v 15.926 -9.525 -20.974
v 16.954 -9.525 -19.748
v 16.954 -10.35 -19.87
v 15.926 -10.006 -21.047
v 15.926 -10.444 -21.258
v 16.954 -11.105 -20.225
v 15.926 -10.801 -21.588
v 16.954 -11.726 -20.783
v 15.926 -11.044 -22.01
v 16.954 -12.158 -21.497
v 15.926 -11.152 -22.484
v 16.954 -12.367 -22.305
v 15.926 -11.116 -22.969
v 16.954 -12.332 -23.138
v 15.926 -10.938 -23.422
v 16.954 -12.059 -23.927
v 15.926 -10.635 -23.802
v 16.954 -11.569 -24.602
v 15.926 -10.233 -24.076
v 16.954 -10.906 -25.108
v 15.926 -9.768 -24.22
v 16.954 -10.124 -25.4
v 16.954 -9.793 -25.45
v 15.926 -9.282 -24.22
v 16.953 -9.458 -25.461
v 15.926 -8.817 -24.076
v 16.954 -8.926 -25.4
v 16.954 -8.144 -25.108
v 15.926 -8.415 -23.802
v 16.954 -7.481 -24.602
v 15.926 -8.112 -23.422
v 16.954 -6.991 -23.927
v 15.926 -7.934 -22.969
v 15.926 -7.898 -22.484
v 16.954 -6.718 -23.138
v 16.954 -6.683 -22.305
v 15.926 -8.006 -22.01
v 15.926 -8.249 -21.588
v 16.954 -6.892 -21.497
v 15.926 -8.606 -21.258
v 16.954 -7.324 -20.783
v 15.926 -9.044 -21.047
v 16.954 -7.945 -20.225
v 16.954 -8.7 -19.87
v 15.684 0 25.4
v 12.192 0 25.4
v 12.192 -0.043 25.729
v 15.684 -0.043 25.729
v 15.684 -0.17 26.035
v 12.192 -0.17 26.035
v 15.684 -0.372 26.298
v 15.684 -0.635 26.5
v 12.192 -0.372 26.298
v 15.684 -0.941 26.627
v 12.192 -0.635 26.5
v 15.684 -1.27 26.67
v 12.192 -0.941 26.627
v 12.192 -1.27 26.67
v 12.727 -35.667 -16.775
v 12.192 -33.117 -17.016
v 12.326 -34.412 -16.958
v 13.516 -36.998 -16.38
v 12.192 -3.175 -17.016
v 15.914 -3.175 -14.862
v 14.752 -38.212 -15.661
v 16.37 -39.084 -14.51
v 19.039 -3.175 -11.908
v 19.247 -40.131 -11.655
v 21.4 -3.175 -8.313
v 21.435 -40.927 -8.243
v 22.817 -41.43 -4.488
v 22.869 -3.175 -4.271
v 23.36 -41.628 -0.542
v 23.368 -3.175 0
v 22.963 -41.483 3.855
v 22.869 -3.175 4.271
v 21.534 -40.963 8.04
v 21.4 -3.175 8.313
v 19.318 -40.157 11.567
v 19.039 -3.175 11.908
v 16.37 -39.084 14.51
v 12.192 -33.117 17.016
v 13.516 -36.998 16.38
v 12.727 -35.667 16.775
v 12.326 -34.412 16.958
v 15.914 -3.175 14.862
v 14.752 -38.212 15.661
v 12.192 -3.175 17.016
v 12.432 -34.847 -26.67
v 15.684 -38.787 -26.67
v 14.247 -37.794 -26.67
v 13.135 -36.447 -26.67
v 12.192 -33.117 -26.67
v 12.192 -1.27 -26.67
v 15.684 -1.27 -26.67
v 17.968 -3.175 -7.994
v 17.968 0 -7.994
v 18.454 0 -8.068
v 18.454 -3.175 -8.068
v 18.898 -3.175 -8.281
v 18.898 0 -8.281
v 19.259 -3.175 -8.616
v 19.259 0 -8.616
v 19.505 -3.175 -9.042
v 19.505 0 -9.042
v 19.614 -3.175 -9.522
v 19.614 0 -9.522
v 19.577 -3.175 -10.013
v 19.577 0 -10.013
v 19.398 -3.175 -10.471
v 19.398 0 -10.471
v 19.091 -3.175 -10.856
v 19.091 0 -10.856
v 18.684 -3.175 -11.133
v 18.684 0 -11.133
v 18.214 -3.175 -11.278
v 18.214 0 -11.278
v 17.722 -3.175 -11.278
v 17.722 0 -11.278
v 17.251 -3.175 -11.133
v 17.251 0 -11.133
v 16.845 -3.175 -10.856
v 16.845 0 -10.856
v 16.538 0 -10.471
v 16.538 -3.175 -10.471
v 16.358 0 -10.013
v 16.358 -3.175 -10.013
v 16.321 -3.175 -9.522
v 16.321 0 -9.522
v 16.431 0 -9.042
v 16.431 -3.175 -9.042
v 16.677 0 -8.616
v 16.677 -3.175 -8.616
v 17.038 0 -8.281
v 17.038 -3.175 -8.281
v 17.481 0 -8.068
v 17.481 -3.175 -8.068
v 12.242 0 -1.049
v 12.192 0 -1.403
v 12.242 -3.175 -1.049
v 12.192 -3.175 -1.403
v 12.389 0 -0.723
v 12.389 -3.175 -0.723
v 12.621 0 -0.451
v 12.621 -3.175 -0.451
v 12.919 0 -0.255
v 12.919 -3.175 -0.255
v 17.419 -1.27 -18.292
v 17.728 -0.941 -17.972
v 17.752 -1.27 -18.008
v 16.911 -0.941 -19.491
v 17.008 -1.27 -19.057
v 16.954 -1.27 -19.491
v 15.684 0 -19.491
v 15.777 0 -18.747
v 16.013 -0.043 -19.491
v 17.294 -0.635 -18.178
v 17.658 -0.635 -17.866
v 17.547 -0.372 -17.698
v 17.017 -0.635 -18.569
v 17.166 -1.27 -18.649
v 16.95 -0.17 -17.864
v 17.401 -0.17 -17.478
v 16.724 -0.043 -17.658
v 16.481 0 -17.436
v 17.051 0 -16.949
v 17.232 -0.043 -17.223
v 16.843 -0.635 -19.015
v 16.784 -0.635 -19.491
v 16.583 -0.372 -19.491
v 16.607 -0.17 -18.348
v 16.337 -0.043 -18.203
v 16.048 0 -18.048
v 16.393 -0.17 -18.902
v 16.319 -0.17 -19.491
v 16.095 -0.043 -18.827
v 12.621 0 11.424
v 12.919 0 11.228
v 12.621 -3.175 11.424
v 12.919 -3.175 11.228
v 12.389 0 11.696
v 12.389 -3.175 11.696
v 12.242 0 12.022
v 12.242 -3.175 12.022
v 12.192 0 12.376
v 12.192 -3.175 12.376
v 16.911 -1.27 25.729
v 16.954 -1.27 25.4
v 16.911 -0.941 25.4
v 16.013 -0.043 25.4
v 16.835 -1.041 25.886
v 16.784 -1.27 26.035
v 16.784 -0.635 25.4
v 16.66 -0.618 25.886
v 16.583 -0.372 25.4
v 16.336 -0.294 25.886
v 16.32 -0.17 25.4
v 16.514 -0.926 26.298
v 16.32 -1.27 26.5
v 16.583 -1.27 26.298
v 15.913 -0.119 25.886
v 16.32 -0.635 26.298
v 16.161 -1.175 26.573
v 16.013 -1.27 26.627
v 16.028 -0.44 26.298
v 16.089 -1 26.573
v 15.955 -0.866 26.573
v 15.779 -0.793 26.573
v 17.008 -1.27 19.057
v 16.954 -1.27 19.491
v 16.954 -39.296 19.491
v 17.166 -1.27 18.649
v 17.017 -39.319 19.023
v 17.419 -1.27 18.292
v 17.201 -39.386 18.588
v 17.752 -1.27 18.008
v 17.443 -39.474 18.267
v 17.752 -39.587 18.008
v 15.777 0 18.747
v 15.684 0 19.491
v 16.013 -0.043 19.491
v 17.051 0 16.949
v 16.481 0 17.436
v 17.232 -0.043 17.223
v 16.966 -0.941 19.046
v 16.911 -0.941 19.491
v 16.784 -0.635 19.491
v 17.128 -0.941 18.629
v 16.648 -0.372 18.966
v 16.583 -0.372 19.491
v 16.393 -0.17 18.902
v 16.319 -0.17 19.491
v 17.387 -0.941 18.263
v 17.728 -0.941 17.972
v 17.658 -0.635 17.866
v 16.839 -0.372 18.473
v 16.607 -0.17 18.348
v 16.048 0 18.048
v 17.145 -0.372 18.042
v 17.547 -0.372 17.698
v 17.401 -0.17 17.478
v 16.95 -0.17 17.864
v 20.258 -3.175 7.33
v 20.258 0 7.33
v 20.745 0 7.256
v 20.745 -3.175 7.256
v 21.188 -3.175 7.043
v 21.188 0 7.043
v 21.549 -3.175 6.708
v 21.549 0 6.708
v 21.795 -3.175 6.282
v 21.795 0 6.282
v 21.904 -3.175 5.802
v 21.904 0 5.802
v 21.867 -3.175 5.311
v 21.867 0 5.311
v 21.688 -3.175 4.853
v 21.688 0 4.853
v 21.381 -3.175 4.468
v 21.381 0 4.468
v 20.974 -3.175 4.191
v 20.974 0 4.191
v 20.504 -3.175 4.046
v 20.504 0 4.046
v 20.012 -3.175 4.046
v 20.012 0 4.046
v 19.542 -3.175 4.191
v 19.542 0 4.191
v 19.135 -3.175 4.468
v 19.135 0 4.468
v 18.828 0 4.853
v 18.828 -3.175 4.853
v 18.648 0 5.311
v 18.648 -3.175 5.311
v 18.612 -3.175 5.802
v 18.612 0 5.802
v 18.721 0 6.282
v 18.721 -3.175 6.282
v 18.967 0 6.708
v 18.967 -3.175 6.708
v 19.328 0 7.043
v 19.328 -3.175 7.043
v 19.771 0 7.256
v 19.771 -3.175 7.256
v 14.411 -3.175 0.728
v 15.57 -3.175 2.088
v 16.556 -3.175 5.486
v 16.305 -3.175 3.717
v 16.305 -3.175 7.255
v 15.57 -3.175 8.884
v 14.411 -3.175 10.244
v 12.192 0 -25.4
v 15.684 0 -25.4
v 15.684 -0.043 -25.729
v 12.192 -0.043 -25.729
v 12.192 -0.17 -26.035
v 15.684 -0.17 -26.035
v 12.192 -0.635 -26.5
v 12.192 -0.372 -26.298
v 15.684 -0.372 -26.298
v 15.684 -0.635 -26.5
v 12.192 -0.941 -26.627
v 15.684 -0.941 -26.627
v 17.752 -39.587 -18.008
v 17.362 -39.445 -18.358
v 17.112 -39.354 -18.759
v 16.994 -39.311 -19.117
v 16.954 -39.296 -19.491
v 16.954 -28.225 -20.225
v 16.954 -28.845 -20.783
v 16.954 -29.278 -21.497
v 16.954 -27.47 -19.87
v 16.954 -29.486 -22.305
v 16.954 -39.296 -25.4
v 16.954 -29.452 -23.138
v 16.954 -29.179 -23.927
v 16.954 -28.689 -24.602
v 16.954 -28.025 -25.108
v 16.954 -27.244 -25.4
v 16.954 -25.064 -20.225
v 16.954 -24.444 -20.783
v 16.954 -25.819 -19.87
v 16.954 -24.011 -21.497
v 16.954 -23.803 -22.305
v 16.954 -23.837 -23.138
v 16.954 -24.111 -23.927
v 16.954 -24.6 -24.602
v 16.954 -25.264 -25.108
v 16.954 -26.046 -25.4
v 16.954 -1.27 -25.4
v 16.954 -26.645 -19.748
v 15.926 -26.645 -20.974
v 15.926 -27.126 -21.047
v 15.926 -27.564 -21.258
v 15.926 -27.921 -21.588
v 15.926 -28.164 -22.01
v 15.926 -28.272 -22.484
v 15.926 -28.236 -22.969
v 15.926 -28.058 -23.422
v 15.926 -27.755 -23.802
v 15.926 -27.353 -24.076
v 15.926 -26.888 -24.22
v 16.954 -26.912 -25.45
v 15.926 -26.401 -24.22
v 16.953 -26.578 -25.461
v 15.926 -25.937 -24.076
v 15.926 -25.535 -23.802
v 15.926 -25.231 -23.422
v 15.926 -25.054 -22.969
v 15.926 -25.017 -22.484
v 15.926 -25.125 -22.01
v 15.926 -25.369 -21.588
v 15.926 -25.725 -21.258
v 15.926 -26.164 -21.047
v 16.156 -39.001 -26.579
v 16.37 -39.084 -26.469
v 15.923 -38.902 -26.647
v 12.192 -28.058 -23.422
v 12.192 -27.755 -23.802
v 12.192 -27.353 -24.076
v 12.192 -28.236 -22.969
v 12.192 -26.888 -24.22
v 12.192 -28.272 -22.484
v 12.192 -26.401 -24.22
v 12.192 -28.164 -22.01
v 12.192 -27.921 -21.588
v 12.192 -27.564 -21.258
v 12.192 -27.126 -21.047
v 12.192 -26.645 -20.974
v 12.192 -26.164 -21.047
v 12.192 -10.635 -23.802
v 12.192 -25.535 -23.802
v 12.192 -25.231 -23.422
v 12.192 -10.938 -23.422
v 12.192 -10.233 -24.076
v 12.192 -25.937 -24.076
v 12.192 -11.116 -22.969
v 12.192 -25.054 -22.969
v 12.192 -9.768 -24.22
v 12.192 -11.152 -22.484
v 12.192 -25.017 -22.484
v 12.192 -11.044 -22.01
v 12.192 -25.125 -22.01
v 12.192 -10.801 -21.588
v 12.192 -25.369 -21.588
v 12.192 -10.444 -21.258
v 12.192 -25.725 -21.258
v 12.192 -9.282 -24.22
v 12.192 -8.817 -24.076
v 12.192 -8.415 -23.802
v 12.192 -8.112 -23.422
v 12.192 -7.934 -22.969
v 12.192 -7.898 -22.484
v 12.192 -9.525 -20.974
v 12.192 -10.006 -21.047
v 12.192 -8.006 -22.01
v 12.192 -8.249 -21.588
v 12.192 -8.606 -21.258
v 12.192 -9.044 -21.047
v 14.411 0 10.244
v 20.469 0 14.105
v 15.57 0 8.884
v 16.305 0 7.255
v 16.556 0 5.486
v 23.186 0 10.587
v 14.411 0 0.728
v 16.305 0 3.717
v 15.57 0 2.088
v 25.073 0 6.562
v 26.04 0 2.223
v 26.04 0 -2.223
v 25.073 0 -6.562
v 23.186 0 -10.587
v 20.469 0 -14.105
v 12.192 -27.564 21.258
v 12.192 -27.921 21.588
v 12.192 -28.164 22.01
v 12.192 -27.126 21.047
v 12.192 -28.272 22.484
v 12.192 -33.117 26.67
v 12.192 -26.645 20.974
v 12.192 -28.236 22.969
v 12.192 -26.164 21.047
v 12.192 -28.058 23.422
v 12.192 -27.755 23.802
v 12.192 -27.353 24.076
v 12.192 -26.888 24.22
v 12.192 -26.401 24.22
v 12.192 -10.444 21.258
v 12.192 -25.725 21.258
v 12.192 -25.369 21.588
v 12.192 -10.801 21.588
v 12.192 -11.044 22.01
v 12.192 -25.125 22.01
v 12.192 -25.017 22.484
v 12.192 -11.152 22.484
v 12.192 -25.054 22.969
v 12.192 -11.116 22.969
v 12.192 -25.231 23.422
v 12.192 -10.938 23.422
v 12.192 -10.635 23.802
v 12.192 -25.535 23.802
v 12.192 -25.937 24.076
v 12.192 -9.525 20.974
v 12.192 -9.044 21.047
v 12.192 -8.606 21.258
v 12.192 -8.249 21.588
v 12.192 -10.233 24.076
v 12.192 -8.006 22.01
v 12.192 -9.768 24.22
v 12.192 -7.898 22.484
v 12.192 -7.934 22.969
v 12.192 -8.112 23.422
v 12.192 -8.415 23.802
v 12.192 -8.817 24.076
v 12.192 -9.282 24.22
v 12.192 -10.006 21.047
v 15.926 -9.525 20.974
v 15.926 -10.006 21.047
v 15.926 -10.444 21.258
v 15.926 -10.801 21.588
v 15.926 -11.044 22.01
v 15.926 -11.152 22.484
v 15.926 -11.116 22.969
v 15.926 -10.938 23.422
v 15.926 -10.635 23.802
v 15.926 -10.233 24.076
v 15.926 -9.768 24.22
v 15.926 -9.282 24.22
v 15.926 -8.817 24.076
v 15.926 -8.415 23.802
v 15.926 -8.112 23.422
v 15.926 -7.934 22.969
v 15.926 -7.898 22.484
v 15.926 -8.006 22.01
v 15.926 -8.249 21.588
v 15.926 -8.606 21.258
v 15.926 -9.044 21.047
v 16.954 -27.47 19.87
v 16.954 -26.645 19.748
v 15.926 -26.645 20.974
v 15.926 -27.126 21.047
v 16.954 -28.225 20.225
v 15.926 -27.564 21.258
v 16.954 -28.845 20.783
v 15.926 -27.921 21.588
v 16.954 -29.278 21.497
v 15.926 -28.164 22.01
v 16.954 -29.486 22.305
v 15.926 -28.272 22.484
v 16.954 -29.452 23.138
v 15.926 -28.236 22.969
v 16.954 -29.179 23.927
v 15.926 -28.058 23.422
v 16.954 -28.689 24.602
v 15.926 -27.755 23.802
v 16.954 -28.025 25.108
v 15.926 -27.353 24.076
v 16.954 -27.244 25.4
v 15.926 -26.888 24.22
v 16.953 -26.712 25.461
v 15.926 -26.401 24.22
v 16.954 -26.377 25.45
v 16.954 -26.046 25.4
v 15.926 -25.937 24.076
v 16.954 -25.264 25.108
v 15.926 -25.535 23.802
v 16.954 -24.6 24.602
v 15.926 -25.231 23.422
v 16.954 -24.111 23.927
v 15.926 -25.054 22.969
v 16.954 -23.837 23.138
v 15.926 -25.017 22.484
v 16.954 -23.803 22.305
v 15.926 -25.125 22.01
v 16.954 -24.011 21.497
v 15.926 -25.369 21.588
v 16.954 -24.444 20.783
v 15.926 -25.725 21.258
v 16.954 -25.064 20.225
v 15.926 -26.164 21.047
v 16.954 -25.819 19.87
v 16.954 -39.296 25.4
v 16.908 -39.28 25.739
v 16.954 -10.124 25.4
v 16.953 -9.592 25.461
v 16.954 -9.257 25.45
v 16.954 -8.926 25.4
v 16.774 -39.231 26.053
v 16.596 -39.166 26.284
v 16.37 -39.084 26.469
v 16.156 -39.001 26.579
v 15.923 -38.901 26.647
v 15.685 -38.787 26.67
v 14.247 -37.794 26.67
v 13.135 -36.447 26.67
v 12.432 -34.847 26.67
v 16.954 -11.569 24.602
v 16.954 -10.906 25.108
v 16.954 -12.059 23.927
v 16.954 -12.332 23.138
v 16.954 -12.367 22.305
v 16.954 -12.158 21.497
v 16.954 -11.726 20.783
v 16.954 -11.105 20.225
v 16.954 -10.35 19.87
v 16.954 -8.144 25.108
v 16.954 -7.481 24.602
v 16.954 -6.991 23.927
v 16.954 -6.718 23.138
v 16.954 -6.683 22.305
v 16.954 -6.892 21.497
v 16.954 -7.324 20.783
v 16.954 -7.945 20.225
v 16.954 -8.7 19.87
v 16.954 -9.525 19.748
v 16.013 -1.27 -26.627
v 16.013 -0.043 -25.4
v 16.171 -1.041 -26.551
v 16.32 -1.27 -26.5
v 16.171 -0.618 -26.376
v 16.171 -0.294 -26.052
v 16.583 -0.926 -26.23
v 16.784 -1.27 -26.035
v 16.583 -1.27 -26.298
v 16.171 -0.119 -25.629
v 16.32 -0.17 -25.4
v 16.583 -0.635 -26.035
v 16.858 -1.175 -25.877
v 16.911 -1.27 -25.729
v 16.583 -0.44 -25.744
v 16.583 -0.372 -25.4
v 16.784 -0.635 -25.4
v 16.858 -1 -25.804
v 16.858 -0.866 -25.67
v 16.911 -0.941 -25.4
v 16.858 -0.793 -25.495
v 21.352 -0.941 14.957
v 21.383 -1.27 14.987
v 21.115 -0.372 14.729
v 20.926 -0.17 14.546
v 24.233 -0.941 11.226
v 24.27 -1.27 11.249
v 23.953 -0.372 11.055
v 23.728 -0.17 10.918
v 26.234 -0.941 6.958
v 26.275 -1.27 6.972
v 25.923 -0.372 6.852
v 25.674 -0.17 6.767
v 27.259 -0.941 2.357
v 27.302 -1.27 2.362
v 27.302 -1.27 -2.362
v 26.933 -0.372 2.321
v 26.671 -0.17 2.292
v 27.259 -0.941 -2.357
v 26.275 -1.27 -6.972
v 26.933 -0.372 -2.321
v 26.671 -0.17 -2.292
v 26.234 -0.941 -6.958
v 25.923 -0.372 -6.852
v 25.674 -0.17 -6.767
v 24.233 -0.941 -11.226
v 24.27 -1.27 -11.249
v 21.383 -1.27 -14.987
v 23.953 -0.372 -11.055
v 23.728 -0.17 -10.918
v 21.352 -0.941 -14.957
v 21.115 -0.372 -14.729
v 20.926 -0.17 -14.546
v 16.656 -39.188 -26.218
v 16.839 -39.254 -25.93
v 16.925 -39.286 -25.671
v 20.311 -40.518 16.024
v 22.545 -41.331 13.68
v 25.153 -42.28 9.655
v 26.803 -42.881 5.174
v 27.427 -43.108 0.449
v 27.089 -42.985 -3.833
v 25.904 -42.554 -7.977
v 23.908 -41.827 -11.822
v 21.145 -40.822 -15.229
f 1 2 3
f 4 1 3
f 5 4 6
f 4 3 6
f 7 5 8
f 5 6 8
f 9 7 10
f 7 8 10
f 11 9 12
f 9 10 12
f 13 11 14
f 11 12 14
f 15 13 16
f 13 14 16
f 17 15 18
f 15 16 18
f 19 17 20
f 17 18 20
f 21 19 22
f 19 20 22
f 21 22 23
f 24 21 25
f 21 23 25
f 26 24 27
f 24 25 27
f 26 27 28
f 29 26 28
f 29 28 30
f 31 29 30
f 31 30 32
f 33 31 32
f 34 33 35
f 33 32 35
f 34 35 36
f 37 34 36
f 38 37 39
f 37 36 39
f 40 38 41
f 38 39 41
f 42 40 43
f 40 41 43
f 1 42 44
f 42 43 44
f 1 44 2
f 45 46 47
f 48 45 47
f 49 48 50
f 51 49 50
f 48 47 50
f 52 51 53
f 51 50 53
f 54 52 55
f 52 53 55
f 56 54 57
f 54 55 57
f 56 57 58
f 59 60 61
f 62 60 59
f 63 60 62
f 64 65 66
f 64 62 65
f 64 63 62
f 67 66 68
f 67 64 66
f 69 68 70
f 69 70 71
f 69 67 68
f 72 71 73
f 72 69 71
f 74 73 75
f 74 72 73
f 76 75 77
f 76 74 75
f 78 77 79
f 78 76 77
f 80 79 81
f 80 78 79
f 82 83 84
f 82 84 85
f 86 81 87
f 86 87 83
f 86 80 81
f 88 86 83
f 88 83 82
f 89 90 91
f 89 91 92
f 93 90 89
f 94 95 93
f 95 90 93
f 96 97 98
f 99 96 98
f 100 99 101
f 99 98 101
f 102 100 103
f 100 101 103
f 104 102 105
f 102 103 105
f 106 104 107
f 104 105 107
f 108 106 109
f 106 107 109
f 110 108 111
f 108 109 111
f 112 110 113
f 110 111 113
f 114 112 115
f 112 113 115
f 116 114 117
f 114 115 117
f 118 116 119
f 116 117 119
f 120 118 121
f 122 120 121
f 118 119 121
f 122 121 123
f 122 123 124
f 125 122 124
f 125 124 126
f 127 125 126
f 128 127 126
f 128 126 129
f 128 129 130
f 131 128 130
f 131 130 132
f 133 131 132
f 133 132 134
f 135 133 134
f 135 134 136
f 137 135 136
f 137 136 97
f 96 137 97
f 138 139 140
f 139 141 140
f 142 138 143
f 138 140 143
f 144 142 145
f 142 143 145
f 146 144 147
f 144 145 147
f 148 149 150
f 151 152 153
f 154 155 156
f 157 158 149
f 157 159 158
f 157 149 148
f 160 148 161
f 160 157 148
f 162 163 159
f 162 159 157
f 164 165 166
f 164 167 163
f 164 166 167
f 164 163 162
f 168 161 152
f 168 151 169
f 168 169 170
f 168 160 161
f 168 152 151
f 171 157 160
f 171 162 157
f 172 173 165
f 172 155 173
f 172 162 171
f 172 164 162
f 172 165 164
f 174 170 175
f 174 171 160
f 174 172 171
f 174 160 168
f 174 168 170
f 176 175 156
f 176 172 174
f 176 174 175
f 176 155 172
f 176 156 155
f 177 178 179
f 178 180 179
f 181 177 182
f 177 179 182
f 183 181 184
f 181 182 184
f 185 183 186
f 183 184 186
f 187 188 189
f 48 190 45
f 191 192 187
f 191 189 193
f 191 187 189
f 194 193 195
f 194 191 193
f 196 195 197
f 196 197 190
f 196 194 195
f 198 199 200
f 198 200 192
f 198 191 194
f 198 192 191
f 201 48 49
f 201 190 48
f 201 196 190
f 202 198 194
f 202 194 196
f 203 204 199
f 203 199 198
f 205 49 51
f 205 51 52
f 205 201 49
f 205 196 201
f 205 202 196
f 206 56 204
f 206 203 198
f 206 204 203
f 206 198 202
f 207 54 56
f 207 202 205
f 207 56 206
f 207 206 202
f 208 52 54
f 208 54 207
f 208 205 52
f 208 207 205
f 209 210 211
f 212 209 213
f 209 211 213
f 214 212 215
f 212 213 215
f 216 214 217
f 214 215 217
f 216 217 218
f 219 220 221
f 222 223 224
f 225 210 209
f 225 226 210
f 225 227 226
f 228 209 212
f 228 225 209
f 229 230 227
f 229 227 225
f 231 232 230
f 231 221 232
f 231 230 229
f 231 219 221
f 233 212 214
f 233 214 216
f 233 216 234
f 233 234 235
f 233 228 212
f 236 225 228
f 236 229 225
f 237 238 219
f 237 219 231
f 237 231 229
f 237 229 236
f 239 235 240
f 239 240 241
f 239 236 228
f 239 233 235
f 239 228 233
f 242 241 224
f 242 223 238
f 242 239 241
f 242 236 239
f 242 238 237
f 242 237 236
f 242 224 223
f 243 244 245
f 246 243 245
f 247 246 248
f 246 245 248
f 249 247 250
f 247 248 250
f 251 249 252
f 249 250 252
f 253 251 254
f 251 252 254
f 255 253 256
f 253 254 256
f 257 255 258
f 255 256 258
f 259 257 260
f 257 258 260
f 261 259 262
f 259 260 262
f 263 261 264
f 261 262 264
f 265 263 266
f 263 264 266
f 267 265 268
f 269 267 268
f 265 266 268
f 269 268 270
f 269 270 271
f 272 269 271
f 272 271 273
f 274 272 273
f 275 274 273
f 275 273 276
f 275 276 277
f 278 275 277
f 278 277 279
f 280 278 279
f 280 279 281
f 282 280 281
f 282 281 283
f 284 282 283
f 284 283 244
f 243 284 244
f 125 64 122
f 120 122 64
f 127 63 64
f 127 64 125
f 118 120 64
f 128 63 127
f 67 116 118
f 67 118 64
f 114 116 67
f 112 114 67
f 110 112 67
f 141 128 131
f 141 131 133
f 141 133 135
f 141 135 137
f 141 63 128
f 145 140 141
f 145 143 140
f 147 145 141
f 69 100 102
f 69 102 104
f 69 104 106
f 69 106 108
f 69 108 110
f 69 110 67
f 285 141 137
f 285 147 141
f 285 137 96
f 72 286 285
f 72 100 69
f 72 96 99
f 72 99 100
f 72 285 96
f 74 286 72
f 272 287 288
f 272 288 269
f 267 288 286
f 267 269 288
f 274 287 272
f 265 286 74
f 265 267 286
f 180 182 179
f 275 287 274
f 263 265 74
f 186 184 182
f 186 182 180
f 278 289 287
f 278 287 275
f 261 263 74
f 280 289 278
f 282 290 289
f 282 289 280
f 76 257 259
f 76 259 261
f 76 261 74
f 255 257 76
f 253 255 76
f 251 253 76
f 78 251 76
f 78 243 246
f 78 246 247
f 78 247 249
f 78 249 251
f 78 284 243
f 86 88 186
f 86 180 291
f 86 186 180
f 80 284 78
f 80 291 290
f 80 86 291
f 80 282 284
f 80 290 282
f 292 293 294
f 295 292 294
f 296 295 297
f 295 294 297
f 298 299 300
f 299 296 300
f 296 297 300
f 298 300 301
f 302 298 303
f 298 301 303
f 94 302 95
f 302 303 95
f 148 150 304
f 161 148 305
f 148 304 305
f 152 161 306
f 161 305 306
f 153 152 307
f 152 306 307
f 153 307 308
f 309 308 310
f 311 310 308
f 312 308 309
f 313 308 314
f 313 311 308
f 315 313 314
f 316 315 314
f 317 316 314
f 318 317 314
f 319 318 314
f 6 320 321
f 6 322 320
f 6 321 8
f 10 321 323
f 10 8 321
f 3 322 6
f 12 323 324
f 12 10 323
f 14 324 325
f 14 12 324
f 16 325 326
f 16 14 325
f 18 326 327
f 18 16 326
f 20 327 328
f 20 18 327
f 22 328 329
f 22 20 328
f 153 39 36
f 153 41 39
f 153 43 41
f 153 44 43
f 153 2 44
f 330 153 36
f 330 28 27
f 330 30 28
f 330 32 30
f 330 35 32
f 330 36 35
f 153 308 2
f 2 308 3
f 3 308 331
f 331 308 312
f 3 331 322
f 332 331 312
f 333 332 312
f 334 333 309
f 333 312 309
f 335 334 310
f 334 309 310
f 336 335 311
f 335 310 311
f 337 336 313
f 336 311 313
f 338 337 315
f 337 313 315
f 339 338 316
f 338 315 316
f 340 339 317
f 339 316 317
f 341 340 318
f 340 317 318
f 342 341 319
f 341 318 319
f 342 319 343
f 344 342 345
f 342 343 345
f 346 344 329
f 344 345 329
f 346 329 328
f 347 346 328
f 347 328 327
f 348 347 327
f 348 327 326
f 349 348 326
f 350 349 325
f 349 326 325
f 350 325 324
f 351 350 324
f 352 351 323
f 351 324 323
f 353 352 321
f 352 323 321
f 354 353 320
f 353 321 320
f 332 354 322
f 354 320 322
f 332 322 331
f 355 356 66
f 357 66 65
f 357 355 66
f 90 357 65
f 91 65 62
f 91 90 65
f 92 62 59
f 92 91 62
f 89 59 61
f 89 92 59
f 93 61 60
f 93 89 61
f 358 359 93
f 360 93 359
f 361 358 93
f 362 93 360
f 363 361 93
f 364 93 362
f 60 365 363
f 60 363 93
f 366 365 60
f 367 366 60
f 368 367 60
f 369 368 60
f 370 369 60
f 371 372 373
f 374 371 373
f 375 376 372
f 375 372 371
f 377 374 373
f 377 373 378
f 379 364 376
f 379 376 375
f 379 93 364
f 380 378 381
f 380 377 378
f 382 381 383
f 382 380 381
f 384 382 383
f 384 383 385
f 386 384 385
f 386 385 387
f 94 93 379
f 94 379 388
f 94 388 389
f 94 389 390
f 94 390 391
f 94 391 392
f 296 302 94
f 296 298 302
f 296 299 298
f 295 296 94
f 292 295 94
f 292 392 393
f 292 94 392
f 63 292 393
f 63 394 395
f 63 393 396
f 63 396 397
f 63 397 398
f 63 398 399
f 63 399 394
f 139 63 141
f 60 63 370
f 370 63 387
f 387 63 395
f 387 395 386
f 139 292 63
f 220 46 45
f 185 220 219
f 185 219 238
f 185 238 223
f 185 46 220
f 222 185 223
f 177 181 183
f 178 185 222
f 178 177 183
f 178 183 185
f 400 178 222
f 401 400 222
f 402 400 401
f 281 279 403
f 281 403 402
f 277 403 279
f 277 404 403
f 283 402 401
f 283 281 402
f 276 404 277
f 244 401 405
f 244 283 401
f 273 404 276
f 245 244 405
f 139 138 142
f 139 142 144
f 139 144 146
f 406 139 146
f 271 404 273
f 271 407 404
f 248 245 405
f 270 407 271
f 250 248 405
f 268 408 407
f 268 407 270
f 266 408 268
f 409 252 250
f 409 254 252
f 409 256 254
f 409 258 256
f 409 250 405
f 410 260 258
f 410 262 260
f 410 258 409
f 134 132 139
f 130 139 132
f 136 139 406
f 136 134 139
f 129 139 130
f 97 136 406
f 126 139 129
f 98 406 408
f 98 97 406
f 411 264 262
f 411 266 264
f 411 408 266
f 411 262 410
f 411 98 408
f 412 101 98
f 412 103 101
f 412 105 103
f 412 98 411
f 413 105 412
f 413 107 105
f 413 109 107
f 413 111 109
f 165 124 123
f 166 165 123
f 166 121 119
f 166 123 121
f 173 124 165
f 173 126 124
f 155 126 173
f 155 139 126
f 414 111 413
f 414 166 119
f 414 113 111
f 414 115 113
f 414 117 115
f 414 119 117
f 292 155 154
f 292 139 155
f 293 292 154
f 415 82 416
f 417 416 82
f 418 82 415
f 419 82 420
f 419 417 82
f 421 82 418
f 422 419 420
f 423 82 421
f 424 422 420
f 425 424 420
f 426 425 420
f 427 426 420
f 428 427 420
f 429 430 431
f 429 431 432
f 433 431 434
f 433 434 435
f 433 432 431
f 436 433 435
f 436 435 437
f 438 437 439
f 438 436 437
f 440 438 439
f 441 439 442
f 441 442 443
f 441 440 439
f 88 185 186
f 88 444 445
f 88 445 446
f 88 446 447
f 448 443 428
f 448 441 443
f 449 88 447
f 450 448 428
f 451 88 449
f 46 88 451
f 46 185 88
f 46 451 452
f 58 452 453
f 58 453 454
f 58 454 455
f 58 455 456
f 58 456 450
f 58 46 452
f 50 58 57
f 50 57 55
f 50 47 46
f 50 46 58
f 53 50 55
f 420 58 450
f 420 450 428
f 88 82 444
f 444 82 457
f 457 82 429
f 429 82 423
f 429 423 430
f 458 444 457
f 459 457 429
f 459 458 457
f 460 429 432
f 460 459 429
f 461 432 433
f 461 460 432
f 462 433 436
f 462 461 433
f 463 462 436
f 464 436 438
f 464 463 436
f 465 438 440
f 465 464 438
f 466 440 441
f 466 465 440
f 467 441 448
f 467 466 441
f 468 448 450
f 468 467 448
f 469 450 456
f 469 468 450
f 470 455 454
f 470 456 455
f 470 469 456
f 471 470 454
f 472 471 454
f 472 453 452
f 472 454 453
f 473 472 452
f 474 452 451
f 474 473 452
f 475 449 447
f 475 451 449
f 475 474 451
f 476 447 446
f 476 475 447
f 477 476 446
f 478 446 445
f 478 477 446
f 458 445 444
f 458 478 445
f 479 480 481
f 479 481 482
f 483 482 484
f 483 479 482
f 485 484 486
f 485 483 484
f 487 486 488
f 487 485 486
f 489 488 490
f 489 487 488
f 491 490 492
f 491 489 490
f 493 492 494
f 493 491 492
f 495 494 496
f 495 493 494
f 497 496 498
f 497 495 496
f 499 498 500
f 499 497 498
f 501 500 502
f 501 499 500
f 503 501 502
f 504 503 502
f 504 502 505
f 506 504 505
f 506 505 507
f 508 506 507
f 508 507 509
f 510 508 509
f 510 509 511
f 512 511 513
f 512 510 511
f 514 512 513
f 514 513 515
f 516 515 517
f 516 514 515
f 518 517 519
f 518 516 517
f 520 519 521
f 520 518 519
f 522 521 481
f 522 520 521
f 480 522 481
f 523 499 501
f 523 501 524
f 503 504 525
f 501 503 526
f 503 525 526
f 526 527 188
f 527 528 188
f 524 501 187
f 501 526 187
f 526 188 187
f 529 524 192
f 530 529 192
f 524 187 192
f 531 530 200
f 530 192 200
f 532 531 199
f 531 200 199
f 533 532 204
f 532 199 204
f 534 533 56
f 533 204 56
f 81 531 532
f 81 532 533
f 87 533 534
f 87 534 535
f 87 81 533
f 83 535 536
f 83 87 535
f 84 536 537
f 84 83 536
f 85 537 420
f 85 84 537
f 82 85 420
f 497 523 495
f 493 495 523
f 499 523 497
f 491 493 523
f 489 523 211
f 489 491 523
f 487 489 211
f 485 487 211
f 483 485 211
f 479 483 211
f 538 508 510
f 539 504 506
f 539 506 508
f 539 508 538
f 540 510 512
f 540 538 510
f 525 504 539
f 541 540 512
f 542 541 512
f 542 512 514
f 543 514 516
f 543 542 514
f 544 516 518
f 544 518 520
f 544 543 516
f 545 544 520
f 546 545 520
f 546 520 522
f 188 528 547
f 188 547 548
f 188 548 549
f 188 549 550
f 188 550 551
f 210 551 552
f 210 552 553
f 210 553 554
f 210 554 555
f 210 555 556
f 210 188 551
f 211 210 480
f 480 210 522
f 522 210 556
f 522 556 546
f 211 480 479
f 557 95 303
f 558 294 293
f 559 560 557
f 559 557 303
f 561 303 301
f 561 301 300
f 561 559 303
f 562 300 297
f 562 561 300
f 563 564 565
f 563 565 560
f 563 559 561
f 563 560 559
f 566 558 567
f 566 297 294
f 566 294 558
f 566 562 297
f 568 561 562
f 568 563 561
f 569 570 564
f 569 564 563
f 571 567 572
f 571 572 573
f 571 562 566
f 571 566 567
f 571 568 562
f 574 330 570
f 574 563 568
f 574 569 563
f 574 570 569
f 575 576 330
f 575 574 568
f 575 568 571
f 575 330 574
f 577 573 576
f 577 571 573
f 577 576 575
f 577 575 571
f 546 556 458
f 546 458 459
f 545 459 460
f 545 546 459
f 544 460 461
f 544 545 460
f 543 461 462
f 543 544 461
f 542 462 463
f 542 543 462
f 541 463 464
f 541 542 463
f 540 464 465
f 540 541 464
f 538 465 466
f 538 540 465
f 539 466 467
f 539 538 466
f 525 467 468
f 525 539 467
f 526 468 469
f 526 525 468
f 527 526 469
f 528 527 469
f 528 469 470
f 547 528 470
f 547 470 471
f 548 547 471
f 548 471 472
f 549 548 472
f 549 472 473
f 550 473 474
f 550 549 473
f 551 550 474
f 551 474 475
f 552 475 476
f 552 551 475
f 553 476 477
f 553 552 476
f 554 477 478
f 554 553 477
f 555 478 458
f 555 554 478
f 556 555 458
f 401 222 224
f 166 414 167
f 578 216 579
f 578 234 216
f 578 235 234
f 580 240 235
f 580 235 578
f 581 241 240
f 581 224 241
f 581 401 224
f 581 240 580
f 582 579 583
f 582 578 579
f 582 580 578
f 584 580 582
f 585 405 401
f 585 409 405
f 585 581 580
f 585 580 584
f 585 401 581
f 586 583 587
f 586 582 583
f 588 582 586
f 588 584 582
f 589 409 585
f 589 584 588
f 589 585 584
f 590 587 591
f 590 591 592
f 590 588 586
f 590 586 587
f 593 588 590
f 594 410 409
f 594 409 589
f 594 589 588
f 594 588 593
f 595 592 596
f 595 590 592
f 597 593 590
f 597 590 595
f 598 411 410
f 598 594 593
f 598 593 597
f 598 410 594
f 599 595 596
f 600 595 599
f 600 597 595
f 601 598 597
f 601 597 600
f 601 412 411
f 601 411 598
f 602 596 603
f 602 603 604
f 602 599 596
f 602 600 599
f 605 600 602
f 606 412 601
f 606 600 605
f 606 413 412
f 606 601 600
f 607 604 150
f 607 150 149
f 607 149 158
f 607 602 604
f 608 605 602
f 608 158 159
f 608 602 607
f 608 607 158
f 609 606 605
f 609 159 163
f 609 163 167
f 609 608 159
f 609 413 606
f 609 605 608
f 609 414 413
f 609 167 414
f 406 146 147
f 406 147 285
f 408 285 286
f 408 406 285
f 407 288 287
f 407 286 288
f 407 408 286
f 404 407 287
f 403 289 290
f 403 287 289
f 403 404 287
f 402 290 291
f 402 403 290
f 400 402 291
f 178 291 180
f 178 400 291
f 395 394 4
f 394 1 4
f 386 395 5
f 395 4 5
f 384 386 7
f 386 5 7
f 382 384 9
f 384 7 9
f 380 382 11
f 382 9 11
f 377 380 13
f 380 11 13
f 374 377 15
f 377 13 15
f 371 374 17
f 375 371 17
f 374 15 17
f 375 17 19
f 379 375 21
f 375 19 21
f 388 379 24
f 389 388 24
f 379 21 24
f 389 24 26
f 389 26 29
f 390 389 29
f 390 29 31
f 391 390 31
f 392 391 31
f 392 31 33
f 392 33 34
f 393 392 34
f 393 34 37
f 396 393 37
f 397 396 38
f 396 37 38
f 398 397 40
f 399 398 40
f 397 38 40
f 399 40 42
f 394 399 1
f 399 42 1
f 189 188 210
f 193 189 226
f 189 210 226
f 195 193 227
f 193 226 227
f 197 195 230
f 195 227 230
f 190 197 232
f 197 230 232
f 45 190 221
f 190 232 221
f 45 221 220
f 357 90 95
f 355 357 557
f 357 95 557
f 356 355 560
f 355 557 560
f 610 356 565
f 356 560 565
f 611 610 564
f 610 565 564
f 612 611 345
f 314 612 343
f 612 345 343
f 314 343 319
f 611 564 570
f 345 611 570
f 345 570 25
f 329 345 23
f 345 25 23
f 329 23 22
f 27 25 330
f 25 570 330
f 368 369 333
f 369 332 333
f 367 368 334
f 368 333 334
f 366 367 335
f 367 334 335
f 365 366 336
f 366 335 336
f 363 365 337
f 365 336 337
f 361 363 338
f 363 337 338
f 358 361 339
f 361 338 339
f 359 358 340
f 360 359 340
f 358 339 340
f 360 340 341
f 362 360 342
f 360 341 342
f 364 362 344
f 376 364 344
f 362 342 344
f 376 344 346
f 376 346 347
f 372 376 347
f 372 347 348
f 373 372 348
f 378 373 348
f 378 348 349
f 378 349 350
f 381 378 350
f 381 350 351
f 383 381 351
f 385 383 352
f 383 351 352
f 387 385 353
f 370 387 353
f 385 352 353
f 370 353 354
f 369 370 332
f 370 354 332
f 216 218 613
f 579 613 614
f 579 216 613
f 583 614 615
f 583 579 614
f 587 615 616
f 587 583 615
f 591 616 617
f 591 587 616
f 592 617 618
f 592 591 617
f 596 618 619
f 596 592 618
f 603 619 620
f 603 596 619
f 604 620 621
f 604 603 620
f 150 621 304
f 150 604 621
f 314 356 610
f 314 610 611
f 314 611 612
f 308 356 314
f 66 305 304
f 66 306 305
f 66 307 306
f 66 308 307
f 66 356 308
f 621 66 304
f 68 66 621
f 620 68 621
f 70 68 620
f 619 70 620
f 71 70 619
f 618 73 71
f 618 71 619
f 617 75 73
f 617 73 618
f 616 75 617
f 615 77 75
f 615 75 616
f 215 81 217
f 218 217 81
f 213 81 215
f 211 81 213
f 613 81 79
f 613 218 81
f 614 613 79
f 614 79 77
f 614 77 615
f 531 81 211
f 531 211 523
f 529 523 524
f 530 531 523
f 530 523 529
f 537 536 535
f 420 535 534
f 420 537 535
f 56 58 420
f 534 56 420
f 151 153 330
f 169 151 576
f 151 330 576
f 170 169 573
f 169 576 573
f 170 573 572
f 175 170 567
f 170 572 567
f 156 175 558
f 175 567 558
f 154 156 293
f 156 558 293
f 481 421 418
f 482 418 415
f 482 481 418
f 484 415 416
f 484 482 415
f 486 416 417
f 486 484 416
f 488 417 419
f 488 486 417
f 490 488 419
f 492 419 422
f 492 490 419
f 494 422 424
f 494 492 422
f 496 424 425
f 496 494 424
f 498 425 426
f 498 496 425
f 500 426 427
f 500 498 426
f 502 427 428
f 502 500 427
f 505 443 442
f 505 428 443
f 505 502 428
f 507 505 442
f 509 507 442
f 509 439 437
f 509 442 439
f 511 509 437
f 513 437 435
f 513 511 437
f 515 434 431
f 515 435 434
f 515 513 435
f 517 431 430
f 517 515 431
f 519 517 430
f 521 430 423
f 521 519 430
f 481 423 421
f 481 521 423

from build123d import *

# Parameters (mm, degrees)
BOSS_EXTRUDE1_DEPTH                       = 43.942
CUT_EXTRUDE1_START                        = -40.767
CUT_EXTRUDE1_DEPTH                        = 40.767
FILLET1_R                                 = 1.27
CSK_FOR_4_FLAT_HEAD_MACHINE_SCREW_2_COUNT = 2
CSK_FOR_4_FLAT_HEAD_MACHINE_SCREW_2_PITCH = 17.1196
CUT_EXTRUDE2_DEPTH                        = 75.354351507
FILLET3_R                                 = 1.778
FILLET4_R                                 = 1.27
FILLET5_R                                 = 6.35
SKETCH8_R                                 = 1.651
CUT_EXTRUDE3_DEPTH                        = 40.767


with BuildPart() as part:
    # Sketch1 → Boss-Extrude1 (new body)
    with BuildSketch(Plane(origin=(0, 0, 0), x_dir=(1, 0, 0), z_dir=(0, 1, 0))):
        with BuildLine():
            Line((12.192, 26.67), (12.192, 0.545071947))
            ThreePointArc((12.192, 0.545071947), (16.556076609, -5.486396223), (12.192, -11.517864393))
            Line((12.192, -11.517864393), (12.192, -26.67))
            Line((12.192, -26.67), (16.9545, -26.67))
            Line((16.9545, -26.67), (16.9545, -19.977285695))
            Line((16.9545, -19.977285695), (16.9545, -18.510549526))
            ThreePointArc((16.9545, -18.510549526), (27.432, 0), (16.9545, 18.510549526))
            Line((16.9545, 18.510549526), (16.9545, 19.977285695))
            Line((16.9545, 19.977285695), (16.9545, 26.67))
            Line((16.9545, 26.67), (12.192, 26.67))
        make_face()
    extrude(amount=-BOSS_EXTRUDE1_DEPTH)

    # Sketch3 → Cut-Extrude1 (cut)
    with BuildSketch(Plane.XZ.offset(43.942).offset(CUT_EXTRUDE1_START)):
        with BuildLine():
            ThreePointArc((12.192, -17.016104372), (23.368, 0), (12.192, 17.016104372))
            Line((12.192, 17.016104372), (12.192, 11.517864393))
            ThreePointArc((12.192, 11.517864393), (16.556076609, 5.486396223), (12.192, -0.545071947))
            Line((12.192, -0.545071947), (12.192, -17.016104372))
        make_face()
    extrude(amount=CUT_EXTRUDE1_DEPTH, mode=Mode.SUBTRACT)

    # Fillet1
    fillet1_edges = [part.edges().sort_by_distance(p)[0] for p in [
        (12.192, -1.5875, -0.545071947),
        (12.192, -1.5875, 11.517864393),
    ]]
    fillet(fillet1_edges, radius=FILLET1_R)

    # Sketch6 → CSK for #4 Flat Head Machine Screw (100)1 (revolve, cut)
    with BuildSketch(Plane(origin=(16.9545, -9.525, 22.606), x_dir=(0, 0, -1), z_dir=(0, 1, 0))):
        Polygon((0, 0), (0, 7.838574487), (1.63195, 6.858), (1.63195, 1.028358553), (2.8575, 0), align=None)
    csk_for_4_flat_head_machine_screw_100 = revolve(axis=Axis((23.3045, -9.525, 22.606), (-1, 0, 0)), mode=Mode.SUBTRACT)

    # CSK for _4 Flat Head Machine Screw _ 2: CSK for #4 Flat Head Machine Screw (100)1 ×2
    with Locations(*[(0, -i * CSK_FOR_4_FLAT_HEAD_MACHINE_SCREW_2_PITCH, 0) for i in range(1, CSK_FOR_4_FLAT_HEAD_MACHINE_SCREW_2_COUNT)]):
        add(csk_for_4_flat_head_machine_screw_100, mode=Mode.SUBTRACT)

    # Mirror1: CSK for #4 Flat Head Machine Screw (100)1 across plane
    add(csk_for_4_flat_head_machine_screw_100.mirror(Plane.XY), mode=Mode.SUBTRACT)

    # Mirror1 copy 1 sketch → Mirror1 copy 1 (revolve, cut)
    with BuildSketch(Plane(origin=(16.9545, -26.6446, -22.606), x_dir=(0, 0, 1), z_dir=(0, 1, 0))):
        Polygon((0, 0), (0, -7.838574487), (1.63195, -6.858), (1.63195, -1.028358553), (2.8575, 0), align=None)
    revolve(axis=Axis((23.3045, -26.6446, -22.606), (1, 0, 0)), mode=Mode.SUBTRACT)

    # Sketch7 → Cut-Extrude2 (cut, through all)
    with BuildSketch(Plane.XY.offset(26.67)):
        Polygon((12.192, -37.563057674), (29.718, -43.942), (12.192, -43.942), align=None)
    extrude(amount=-CUT_EXTRUDE2_DEPTH, mode=Mode.SUBTRACT)

    # Fillet3
    fillet3_edges = [part.edges().sort_by_distance(p)[0] for p in [
        (16.9545, -19.648232957, -18.510549526),
        (16.9545, -19.648232957, 18.510549526),
    ]]
    fillet(fillet3_edges, radius=FILLET3_R)

    # Fillet4
    # the kernel refuses this fillet: 1.27 mm, written as the material it takes off along each edge
    with BuildSketch(Plane(origin=(15.6845, -1.27, -25.4), x_dir=(0, 0, -1), z_dir=(1, 0, 0))) as fillet4_piece_1_section:
        Polygon((0, 0), (FILLET4_R, 0), (FILLET4_R, FILLET4_R), (0, FILLET4_R), align=None)
    fillet4_piece_1 = extrude(amount=FILLET4_R, mode=Mode.PRIVATE)
    fillet4_piece_1 = fillet4_piece_1 - Plane(origin=(15.6845, -1.27, -25.4), x_dir=(0, -0.7071067811865475, 0.7071067811865475), z_dir=(1, 0, 0)) * Sphere(FILLET4_R, mode=Mode.PRIVATE)
    add(fillet4_piece_1, mode=Mode.SUBTRACT)
    with BuildSketch(Plane(origin=(15.6845, -1.27, 25.4), x_dir=(1, 0, 0), z_dir=(0, 0, 1))) as fillet4_piece_2_section:
        Polygon((0, 0), (FILLET4_R, 0), (FILLET4_R, FILLET4_R), (0, FILLET4_R), align=None)
    fillet4_piece_2 = extrude(amount=FILLET4_R, mode=Mode.PRIVATE)
    fillet4_piece_2 = fillet4_piece_2 - Plane(origin=(15.6845, -1.27, 25.4), x_dir=(-0.7071067811865475, -0.7071067811865475, 0), z_dir=(0, 0, 1)) * Sphere(FILLET4_R, mode=Mode.PRIVATE)
    add(fillet4_piece_2, mode=Mode.SUBTRACT)
    with BuildSketch(Plane(origin=(15.6845, 0, -26.67), x_dir=(0, -1, 0), z_dir=(-1, 0, 0)), Plane(origin=(9.017, 0, 26.67), x_dir=(0, -1, 0), z_dir=(1, 0, 0))) as fillet4_piece_3:
        with BuildLine():
            CenterArc((FILLET4_R, FILLET4_R), FILLET4_R, 180, 90)
            Line((0, FILLET4_R), (0, 0))
            Line((0, 0), (FILLET4_R, 0))
        make_face()
    extrude(amount=6.6675, mode=Mode.SUBTRACT)
    with BuildSketch(Plane(origin=(5.842, 0, 0), x_dir=(0.5516304347826092, 0, 0.8340886424245023), z_dir=(-0.8340886424245023, 0, 0.5516304347826092))) as fillet4_piece_4:
        with BuildLine():
            CenterArc((21.59 - FILLET4_R, -FILLET4_R), FILLET4_R, 0, 90)
            Line((21.59 - FILLET4_R, 0), (21.59, 0))
            Line((21.59, 0), (21.59, -FILLET4_R))
        make_face()
    revolve(axis=Axis((5.842, 0, 0), (0, 1, 0)), revolution_arc=113.042120672, mode=Mode.SUBTRACT)
    with BuildSketch(Plane(origin=(16.9545, 0, -25.4), x_dir=(0, -1, 0), z_dir=(0, 0, 1)), Plane(origin=(16.9545, 0, 19.490983396), x_dir=(0, -1, 0), z_dir=(0, 0, 1))) as fillet4_piece_5:
        with BuildLine():
            CenterArc((FILLET4_R, -FILLET4_R), FILLET4_R, 90, 90)
            Line((0, -FILLET4_R), (0, 0))
            Line((0, 0), (FILLET4_R, 0))
        make_face()
    extrude(amount=5.909016604, mode=Mode.SUBTRACT)
    with BuildSketch(Plane(origin=(18.7325, 0, -19.490983396), x_dir=(-0.5516304347826076, 0, 0.8340886424245035), z_dir=(0.8340886424245035, 0, 0.5516304347826076))) as fillet4_piece_6:
        with BuildLine():
            CenterArc((1.778 + FILLET4_R, FILLET4_R), FILLET4_R, 180, 90)
            Line((1.778 + FILLET4_R, 0), (1.778, 0))
            Line((1.778, 0), (1.778, FILLET4_R))
        make_face()
    revolve(axis=Axis((18.7325, 0, -19.490983396), (0, -1, 0)), revolution_arc=56.521060336, mode=Mode.SUBTRACT)
    with BuildSketch(Plane(origin=(18.7325, 0, 19.490983396), x_dir=(-1, 0, 0), z_dir=(0, 0, 1))) as fillet4_piece_7:
        with BuildLine():
            CenterArc((1.778 + FILLET4_R, FILLET4_R), FILLET4_R, 180, 90)
            Line((1.778 + FILLET4_R, 0), (1.778, 0))
            Line((1.778, 0), (1.778, FILLET4_R))
        make_face()
    revolve(axis=Axis((18.7325, 0, 19.490983396), (0, -1, 0)), revolution_arc=56.521060336, mode=Mode.SUBTRACT)
    with BuildSketch(Plane(origin=(16.9545, -1.27, 26.67), x_dir=(0, 0, -1), z_dir=(0, -1, 0))) as fillet4_piece_8:
        with BuildLine():
            CenterArc((FILLET4_R, -FILLET4_R), FILLET4_R, 90, 90)
            Line((0, -FILLET4_R), (0, 0))
            Line((0, 0), (FILLET4_R, 0))
        make_face()
    extrude(amount=41.201465915, mode=Mode.SUBTRACT)
    with BuildSketch(Plane(origin=(16.9545, -1.27, -26.67), x_dir=(0, 0, 1), z_dir=(0, -1, 0))) as fillet4_piece_9:
        with BuildLine():
            CenterArc((FILLET4_R, FILLET4_R), FILLET4_R, 180, 90)
            Line((0, FILLET4_R), (0, 0))
            Line((0, 0), (FILLET4_R, 0))
        make_face()
    extrude(amount=41.201465915, mode=Mode.SUBTRACT)

    # Fillet5
    fillet5_edges = [part.edges().sort_by_distance(p)[0] for p in [
        (12.192, -37.563057674, -21.843052186),
        (12.192, -37.563057674, 21.843052186),
    ]]
    fillet(fillet5_edges, radius=FILLET5_R)

    # Sketch8 → Cut-Extrude3 (cut)
    with BuildSketch(Plane(origin=(0, 0, 0), x_dir=(1, 0, 0), z_dir=(0, 1, 0))):
        with Locations(Location((17.967730782, 9.64524178, 0), (0, 0, 270))):
            Circle(SKETCH8_R)
        with Locations(Location((20.257889798, -5.678570007, 0), (0, 0, 270))):
            Circle(SKETCH8_R)
    extrude(amount=-CUT_EXTRUDE3_DEPTH, mode=Mode.SUBTRACT)


solid = part.part
